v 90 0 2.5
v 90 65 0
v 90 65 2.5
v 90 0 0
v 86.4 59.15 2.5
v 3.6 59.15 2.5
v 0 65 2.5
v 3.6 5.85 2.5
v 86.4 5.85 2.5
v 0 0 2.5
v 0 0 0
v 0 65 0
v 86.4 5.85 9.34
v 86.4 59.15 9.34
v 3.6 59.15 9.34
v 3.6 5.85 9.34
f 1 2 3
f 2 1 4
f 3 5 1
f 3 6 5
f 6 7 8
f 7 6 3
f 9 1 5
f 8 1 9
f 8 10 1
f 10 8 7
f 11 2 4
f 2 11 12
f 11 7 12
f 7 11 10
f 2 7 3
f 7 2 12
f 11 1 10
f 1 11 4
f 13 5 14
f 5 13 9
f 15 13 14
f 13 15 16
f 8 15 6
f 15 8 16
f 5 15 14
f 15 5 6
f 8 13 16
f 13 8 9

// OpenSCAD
union() {
	translate(v = [45.0, 32.5, 1.25]) {
		cube(center = true, size = [90.0, 65.0, 2.5]);
	}
	translate(v = [45.0, 32.5, 5.92]) {
		cube(center = true, size = [82.8, 53.3, 6.84]);
	}
}
